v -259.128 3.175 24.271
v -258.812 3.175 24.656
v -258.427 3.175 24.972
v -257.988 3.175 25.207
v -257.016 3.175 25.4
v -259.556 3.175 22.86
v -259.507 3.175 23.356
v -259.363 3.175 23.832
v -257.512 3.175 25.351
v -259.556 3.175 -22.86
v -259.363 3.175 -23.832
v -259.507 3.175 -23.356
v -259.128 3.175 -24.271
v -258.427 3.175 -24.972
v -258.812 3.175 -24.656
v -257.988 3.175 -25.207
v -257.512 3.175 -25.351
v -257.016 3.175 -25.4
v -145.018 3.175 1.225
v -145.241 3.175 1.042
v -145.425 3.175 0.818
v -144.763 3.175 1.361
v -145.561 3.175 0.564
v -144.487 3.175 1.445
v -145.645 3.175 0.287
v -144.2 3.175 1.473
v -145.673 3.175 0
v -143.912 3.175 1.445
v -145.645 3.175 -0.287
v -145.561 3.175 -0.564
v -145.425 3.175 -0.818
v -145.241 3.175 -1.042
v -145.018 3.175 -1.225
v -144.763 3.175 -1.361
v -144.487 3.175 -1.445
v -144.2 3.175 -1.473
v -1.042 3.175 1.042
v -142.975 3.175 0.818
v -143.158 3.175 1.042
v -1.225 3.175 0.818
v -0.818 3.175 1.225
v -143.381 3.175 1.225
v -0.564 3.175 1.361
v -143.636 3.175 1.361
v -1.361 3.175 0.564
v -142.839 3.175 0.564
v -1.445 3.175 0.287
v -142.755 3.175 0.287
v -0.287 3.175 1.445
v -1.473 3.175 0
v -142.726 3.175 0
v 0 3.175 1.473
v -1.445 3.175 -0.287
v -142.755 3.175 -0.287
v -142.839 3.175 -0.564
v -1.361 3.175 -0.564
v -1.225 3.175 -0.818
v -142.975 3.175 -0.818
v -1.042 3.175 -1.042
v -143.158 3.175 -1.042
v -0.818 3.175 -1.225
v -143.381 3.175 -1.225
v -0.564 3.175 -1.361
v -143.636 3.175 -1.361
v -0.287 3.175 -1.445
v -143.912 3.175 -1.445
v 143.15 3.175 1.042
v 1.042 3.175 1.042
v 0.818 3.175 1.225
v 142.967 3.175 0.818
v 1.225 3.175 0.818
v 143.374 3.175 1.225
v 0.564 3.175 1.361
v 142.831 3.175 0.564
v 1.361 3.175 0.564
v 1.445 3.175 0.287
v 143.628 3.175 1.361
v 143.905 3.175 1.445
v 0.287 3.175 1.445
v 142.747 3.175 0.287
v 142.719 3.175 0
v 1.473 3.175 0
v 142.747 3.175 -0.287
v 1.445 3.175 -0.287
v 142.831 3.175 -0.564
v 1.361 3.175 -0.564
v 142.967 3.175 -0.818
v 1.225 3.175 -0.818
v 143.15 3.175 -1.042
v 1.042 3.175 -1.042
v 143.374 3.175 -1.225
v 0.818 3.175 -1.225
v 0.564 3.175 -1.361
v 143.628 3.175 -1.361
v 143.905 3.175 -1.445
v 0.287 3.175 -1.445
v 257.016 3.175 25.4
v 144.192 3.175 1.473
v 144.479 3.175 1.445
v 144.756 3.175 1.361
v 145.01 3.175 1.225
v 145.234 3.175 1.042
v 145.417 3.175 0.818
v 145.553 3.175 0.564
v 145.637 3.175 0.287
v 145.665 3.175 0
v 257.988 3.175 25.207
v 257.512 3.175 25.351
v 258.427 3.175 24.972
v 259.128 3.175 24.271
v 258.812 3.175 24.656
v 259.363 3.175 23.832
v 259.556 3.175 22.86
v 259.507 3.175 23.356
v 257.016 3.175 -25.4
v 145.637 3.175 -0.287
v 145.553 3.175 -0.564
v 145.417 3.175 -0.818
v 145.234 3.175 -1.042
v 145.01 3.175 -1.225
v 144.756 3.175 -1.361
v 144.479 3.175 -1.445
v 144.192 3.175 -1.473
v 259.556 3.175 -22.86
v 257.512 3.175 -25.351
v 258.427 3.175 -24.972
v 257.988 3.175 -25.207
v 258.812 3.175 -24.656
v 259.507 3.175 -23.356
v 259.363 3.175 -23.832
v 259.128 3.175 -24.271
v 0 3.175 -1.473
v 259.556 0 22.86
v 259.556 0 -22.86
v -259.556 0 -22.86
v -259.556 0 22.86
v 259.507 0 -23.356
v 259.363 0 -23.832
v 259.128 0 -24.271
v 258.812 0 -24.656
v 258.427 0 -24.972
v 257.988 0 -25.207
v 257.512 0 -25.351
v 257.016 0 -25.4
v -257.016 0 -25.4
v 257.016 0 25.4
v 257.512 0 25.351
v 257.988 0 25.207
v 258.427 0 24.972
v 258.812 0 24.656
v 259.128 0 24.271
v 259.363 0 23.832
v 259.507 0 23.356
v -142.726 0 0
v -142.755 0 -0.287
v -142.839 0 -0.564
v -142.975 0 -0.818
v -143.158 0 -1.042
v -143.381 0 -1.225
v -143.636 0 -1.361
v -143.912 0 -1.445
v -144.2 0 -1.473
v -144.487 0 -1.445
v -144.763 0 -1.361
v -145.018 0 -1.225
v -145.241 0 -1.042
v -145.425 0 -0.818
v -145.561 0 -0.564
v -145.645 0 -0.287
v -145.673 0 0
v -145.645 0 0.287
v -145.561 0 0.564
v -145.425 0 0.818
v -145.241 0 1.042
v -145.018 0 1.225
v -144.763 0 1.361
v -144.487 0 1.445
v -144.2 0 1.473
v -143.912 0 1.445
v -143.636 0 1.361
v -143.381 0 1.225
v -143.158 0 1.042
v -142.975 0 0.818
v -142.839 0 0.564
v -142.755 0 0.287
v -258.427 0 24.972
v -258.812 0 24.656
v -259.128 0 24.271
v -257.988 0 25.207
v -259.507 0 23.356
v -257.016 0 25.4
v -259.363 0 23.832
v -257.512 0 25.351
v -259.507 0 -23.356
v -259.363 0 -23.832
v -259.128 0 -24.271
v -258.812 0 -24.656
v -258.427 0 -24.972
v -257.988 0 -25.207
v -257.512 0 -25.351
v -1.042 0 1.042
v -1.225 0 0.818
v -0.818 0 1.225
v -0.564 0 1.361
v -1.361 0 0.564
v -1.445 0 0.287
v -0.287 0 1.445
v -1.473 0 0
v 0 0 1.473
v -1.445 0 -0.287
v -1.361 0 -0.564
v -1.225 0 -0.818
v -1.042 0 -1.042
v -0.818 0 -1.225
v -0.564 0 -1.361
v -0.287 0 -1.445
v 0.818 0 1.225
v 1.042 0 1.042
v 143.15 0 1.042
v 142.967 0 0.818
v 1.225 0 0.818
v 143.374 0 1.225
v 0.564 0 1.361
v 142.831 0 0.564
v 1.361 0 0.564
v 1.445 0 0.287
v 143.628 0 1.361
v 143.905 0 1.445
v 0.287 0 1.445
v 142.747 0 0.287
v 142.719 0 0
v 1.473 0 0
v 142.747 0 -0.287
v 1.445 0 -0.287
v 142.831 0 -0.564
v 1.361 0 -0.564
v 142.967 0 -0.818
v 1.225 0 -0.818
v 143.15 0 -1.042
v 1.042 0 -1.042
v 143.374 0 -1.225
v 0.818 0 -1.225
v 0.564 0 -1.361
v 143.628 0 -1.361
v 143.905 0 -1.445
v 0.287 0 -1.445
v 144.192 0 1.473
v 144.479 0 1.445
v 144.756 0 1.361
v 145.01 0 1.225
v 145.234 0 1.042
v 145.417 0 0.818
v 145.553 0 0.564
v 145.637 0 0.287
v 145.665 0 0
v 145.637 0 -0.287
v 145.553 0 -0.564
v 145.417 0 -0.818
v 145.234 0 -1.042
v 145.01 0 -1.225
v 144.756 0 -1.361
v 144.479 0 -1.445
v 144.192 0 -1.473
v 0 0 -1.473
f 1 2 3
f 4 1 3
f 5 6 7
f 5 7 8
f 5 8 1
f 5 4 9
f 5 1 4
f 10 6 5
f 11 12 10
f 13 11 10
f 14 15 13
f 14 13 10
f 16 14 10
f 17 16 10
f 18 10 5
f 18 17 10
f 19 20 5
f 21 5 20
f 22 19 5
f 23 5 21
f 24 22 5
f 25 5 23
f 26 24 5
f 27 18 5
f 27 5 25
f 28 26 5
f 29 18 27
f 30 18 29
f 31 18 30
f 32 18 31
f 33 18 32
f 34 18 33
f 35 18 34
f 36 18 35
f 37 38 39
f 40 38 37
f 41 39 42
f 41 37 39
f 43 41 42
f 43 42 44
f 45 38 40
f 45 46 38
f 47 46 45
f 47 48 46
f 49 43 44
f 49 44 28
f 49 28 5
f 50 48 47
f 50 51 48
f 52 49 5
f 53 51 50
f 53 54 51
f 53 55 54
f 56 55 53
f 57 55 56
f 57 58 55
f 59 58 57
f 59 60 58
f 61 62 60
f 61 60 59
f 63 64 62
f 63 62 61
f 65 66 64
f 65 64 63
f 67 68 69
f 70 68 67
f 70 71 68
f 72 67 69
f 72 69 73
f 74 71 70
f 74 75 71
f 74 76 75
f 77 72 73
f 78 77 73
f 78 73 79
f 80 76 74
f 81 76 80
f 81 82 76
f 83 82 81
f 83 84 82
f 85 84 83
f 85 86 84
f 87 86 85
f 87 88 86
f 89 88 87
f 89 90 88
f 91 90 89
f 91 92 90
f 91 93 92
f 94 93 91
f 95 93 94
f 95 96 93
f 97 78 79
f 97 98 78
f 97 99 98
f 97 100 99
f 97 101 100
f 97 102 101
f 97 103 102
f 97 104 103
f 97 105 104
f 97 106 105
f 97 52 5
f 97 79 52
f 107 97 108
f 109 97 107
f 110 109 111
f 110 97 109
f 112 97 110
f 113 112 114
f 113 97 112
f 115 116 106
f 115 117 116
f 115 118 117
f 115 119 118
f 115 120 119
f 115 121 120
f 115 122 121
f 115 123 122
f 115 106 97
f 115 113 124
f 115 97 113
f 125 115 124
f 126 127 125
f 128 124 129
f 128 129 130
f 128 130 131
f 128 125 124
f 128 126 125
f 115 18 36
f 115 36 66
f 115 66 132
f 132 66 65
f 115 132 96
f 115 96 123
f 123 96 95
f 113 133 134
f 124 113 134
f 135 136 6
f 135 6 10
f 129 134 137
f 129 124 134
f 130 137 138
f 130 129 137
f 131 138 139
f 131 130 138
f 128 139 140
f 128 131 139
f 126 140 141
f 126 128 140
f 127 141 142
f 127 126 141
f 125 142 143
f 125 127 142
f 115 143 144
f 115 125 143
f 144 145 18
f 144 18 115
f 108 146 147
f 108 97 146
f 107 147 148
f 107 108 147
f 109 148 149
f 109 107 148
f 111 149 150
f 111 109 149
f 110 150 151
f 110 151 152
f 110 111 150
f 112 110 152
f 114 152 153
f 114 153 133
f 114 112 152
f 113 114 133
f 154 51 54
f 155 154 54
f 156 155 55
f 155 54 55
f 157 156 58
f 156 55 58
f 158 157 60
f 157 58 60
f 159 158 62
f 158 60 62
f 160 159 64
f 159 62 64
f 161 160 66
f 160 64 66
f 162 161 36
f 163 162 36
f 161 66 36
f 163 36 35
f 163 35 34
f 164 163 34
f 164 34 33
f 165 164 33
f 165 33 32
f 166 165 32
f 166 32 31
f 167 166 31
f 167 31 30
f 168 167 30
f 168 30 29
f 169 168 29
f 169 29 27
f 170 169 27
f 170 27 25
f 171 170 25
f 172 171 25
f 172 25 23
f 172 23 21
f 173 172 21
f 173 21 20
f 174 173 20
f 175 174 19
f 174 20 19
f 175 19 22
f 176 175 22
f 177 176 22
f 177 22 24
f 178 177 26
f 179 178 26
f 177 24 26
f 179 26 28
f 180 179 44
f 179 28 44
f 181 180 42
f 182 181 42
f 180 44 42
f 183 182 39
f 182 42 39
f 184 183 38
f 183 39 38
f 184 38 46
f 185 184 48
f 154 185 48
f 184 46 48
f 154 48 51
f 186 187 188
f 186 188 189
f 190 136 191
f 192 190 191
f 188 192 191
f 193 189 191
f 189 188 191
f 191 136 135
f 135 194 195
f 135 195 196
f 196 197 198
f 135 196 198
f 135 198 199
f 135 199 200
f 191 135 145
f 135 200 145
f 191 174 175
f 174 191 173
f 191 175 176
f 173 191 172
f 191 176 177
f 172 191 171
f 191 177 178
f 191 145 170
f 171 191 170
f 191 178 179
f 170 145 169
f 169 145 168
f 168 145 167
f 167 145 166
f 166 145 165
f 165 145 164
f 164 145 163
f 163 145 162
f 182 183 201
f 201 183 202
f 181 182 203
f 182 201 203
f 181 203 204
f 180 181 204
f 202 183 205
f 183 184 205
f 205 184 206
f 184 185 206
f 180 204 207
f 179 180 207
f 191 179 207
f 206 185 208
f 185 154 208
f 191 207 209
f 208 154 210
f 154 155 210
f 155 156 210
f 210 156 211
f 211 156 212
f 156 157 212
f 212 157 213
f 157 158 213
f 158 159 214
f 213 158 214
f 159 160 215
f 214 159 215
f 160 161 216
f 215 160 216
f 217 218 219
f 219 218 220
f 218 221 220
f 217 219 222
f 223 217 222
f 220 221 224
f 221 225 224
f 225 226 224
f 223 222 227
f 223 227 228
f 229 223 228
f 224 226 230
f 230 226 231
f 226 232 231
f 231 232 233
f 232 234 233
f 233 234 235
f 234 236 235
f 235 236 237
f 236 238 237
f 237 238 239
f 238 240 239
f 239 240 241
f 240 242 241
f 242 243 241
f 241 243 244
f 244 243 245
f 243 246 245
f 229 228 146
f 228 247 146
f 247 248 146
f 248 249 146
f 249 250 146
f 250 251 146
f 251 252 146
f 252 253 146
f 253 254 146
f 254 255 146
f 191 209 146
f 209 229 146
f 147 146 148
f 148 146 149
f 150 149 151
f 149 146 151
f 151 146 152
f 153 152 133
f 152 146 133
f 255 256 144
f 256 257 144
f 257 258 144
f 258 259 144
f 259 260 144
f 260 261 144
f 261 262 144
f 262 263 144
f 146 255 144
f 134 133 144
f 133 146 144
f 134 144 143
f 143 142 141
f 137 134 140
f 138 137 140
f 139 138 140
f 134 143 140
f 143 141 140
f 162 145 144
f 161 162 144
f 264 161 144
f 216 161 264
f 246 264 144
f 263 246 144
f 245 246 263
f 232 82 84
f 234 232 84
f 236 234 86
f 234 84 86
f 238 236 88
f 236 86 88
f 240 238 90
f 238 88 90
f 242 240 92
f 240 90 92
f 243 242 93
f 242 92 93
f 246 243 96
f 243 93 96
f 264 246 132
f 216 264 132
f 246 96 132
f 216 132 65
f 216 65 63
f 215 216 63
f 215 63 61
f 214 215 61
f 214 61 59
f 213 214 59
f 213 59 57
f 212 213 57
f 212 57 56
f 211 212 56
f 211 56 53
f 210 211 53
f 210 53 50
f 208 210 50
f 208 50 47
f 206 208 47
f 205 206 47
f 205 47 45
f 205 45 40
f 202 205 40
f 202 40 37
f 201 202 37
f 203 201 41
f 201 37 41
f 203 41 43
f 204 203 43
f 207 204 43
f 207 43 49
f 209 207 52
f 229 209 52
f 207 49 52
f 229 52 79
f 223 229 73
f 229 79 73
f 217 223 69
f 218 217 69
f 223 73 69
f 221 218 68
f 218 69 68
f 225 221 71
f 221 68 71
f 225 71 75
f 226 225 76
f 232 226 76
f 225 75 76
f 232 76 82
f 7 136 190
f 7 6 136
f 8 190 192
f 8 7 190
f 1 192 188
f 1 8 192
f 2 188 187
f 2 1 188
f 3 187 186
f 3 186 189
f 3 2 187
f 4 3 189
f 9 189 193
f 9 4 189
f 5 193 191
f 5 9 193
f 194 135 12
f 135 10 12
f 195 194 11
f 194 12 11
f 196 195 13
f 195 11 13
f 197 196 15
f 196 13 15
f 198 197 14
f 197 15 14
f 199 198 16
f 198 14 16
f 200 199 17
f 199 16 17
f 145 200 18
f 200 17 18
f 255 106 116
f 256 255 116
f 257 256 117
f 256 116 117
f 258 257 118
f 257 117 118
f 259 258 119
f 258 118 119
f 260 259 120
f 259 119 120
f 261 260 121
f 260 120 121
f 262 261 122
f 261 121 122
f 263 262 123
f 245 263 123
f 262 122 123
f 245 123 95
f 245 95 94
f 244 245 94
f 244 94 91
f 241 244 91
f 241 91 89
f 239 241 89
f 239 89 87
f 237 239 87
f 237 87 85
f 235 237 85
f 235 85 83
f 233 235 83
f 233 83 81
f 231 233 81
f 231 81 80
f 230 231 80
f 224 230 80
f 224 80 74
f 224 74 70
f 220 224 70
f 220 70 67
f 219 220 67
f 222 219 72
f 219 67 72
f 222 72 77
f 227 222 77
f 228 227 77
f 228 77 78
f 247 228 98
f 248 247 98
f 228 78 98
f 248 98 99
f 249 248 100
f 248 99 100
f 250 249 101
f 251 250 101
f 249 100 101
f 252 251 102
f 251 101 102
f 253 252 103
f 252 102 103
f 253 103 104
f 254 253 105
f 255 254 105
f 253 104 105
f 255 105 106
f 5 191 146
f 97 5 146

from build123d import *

# Parameters (mm, degrees)
SKETCH1_W             = 519.1125
SKETCH1_H             = 50.8
BOSS_EXTRUDE1_DEPTH   = 3.175
FILLET1_R             = 2.54
F_4_CLEARANCE_HOLE1_D = 2.9464


with BuildPart() as part:
    # Sketch1 → Boss-Extrude1 (new body)
    with BuildSketch(Plane(origin=(0, 0, 0), x_dir=(1, 0, 0), z_dir=(0, 1, 0))):
        Rectangle(SKETCH1_W, SKETCH1_H)
    extrude(amount=BOSS_EXTRUDE1_DEPTH)

    # Fillet1
    fillet1_edges = [part.edges().sort_by_distance(p)[0] for p in [
        (259.55625, 1.5875, 25.4),
        (-259.55625, 1.5875, 25.4),
        (-259.55625, 1.5875, -25.4),
        (259.55625, 1.5875, -25.4),
    ]]
    fillet(fillet1_edges, radius=FILLET1_R)

    # #4 Clearance Hole1 (through all)
    with Locations(Plane(origin=(0, 0, 0), x_dir=(-1, 0, 0), z_dir=(0, -1, 0))):
        with Locations((-144.19199, 0), (0, 0), (144.19961, 0)):
            Hole(F_4_CLEARANCE_HOLE1_D / 2)


solid = part.part
